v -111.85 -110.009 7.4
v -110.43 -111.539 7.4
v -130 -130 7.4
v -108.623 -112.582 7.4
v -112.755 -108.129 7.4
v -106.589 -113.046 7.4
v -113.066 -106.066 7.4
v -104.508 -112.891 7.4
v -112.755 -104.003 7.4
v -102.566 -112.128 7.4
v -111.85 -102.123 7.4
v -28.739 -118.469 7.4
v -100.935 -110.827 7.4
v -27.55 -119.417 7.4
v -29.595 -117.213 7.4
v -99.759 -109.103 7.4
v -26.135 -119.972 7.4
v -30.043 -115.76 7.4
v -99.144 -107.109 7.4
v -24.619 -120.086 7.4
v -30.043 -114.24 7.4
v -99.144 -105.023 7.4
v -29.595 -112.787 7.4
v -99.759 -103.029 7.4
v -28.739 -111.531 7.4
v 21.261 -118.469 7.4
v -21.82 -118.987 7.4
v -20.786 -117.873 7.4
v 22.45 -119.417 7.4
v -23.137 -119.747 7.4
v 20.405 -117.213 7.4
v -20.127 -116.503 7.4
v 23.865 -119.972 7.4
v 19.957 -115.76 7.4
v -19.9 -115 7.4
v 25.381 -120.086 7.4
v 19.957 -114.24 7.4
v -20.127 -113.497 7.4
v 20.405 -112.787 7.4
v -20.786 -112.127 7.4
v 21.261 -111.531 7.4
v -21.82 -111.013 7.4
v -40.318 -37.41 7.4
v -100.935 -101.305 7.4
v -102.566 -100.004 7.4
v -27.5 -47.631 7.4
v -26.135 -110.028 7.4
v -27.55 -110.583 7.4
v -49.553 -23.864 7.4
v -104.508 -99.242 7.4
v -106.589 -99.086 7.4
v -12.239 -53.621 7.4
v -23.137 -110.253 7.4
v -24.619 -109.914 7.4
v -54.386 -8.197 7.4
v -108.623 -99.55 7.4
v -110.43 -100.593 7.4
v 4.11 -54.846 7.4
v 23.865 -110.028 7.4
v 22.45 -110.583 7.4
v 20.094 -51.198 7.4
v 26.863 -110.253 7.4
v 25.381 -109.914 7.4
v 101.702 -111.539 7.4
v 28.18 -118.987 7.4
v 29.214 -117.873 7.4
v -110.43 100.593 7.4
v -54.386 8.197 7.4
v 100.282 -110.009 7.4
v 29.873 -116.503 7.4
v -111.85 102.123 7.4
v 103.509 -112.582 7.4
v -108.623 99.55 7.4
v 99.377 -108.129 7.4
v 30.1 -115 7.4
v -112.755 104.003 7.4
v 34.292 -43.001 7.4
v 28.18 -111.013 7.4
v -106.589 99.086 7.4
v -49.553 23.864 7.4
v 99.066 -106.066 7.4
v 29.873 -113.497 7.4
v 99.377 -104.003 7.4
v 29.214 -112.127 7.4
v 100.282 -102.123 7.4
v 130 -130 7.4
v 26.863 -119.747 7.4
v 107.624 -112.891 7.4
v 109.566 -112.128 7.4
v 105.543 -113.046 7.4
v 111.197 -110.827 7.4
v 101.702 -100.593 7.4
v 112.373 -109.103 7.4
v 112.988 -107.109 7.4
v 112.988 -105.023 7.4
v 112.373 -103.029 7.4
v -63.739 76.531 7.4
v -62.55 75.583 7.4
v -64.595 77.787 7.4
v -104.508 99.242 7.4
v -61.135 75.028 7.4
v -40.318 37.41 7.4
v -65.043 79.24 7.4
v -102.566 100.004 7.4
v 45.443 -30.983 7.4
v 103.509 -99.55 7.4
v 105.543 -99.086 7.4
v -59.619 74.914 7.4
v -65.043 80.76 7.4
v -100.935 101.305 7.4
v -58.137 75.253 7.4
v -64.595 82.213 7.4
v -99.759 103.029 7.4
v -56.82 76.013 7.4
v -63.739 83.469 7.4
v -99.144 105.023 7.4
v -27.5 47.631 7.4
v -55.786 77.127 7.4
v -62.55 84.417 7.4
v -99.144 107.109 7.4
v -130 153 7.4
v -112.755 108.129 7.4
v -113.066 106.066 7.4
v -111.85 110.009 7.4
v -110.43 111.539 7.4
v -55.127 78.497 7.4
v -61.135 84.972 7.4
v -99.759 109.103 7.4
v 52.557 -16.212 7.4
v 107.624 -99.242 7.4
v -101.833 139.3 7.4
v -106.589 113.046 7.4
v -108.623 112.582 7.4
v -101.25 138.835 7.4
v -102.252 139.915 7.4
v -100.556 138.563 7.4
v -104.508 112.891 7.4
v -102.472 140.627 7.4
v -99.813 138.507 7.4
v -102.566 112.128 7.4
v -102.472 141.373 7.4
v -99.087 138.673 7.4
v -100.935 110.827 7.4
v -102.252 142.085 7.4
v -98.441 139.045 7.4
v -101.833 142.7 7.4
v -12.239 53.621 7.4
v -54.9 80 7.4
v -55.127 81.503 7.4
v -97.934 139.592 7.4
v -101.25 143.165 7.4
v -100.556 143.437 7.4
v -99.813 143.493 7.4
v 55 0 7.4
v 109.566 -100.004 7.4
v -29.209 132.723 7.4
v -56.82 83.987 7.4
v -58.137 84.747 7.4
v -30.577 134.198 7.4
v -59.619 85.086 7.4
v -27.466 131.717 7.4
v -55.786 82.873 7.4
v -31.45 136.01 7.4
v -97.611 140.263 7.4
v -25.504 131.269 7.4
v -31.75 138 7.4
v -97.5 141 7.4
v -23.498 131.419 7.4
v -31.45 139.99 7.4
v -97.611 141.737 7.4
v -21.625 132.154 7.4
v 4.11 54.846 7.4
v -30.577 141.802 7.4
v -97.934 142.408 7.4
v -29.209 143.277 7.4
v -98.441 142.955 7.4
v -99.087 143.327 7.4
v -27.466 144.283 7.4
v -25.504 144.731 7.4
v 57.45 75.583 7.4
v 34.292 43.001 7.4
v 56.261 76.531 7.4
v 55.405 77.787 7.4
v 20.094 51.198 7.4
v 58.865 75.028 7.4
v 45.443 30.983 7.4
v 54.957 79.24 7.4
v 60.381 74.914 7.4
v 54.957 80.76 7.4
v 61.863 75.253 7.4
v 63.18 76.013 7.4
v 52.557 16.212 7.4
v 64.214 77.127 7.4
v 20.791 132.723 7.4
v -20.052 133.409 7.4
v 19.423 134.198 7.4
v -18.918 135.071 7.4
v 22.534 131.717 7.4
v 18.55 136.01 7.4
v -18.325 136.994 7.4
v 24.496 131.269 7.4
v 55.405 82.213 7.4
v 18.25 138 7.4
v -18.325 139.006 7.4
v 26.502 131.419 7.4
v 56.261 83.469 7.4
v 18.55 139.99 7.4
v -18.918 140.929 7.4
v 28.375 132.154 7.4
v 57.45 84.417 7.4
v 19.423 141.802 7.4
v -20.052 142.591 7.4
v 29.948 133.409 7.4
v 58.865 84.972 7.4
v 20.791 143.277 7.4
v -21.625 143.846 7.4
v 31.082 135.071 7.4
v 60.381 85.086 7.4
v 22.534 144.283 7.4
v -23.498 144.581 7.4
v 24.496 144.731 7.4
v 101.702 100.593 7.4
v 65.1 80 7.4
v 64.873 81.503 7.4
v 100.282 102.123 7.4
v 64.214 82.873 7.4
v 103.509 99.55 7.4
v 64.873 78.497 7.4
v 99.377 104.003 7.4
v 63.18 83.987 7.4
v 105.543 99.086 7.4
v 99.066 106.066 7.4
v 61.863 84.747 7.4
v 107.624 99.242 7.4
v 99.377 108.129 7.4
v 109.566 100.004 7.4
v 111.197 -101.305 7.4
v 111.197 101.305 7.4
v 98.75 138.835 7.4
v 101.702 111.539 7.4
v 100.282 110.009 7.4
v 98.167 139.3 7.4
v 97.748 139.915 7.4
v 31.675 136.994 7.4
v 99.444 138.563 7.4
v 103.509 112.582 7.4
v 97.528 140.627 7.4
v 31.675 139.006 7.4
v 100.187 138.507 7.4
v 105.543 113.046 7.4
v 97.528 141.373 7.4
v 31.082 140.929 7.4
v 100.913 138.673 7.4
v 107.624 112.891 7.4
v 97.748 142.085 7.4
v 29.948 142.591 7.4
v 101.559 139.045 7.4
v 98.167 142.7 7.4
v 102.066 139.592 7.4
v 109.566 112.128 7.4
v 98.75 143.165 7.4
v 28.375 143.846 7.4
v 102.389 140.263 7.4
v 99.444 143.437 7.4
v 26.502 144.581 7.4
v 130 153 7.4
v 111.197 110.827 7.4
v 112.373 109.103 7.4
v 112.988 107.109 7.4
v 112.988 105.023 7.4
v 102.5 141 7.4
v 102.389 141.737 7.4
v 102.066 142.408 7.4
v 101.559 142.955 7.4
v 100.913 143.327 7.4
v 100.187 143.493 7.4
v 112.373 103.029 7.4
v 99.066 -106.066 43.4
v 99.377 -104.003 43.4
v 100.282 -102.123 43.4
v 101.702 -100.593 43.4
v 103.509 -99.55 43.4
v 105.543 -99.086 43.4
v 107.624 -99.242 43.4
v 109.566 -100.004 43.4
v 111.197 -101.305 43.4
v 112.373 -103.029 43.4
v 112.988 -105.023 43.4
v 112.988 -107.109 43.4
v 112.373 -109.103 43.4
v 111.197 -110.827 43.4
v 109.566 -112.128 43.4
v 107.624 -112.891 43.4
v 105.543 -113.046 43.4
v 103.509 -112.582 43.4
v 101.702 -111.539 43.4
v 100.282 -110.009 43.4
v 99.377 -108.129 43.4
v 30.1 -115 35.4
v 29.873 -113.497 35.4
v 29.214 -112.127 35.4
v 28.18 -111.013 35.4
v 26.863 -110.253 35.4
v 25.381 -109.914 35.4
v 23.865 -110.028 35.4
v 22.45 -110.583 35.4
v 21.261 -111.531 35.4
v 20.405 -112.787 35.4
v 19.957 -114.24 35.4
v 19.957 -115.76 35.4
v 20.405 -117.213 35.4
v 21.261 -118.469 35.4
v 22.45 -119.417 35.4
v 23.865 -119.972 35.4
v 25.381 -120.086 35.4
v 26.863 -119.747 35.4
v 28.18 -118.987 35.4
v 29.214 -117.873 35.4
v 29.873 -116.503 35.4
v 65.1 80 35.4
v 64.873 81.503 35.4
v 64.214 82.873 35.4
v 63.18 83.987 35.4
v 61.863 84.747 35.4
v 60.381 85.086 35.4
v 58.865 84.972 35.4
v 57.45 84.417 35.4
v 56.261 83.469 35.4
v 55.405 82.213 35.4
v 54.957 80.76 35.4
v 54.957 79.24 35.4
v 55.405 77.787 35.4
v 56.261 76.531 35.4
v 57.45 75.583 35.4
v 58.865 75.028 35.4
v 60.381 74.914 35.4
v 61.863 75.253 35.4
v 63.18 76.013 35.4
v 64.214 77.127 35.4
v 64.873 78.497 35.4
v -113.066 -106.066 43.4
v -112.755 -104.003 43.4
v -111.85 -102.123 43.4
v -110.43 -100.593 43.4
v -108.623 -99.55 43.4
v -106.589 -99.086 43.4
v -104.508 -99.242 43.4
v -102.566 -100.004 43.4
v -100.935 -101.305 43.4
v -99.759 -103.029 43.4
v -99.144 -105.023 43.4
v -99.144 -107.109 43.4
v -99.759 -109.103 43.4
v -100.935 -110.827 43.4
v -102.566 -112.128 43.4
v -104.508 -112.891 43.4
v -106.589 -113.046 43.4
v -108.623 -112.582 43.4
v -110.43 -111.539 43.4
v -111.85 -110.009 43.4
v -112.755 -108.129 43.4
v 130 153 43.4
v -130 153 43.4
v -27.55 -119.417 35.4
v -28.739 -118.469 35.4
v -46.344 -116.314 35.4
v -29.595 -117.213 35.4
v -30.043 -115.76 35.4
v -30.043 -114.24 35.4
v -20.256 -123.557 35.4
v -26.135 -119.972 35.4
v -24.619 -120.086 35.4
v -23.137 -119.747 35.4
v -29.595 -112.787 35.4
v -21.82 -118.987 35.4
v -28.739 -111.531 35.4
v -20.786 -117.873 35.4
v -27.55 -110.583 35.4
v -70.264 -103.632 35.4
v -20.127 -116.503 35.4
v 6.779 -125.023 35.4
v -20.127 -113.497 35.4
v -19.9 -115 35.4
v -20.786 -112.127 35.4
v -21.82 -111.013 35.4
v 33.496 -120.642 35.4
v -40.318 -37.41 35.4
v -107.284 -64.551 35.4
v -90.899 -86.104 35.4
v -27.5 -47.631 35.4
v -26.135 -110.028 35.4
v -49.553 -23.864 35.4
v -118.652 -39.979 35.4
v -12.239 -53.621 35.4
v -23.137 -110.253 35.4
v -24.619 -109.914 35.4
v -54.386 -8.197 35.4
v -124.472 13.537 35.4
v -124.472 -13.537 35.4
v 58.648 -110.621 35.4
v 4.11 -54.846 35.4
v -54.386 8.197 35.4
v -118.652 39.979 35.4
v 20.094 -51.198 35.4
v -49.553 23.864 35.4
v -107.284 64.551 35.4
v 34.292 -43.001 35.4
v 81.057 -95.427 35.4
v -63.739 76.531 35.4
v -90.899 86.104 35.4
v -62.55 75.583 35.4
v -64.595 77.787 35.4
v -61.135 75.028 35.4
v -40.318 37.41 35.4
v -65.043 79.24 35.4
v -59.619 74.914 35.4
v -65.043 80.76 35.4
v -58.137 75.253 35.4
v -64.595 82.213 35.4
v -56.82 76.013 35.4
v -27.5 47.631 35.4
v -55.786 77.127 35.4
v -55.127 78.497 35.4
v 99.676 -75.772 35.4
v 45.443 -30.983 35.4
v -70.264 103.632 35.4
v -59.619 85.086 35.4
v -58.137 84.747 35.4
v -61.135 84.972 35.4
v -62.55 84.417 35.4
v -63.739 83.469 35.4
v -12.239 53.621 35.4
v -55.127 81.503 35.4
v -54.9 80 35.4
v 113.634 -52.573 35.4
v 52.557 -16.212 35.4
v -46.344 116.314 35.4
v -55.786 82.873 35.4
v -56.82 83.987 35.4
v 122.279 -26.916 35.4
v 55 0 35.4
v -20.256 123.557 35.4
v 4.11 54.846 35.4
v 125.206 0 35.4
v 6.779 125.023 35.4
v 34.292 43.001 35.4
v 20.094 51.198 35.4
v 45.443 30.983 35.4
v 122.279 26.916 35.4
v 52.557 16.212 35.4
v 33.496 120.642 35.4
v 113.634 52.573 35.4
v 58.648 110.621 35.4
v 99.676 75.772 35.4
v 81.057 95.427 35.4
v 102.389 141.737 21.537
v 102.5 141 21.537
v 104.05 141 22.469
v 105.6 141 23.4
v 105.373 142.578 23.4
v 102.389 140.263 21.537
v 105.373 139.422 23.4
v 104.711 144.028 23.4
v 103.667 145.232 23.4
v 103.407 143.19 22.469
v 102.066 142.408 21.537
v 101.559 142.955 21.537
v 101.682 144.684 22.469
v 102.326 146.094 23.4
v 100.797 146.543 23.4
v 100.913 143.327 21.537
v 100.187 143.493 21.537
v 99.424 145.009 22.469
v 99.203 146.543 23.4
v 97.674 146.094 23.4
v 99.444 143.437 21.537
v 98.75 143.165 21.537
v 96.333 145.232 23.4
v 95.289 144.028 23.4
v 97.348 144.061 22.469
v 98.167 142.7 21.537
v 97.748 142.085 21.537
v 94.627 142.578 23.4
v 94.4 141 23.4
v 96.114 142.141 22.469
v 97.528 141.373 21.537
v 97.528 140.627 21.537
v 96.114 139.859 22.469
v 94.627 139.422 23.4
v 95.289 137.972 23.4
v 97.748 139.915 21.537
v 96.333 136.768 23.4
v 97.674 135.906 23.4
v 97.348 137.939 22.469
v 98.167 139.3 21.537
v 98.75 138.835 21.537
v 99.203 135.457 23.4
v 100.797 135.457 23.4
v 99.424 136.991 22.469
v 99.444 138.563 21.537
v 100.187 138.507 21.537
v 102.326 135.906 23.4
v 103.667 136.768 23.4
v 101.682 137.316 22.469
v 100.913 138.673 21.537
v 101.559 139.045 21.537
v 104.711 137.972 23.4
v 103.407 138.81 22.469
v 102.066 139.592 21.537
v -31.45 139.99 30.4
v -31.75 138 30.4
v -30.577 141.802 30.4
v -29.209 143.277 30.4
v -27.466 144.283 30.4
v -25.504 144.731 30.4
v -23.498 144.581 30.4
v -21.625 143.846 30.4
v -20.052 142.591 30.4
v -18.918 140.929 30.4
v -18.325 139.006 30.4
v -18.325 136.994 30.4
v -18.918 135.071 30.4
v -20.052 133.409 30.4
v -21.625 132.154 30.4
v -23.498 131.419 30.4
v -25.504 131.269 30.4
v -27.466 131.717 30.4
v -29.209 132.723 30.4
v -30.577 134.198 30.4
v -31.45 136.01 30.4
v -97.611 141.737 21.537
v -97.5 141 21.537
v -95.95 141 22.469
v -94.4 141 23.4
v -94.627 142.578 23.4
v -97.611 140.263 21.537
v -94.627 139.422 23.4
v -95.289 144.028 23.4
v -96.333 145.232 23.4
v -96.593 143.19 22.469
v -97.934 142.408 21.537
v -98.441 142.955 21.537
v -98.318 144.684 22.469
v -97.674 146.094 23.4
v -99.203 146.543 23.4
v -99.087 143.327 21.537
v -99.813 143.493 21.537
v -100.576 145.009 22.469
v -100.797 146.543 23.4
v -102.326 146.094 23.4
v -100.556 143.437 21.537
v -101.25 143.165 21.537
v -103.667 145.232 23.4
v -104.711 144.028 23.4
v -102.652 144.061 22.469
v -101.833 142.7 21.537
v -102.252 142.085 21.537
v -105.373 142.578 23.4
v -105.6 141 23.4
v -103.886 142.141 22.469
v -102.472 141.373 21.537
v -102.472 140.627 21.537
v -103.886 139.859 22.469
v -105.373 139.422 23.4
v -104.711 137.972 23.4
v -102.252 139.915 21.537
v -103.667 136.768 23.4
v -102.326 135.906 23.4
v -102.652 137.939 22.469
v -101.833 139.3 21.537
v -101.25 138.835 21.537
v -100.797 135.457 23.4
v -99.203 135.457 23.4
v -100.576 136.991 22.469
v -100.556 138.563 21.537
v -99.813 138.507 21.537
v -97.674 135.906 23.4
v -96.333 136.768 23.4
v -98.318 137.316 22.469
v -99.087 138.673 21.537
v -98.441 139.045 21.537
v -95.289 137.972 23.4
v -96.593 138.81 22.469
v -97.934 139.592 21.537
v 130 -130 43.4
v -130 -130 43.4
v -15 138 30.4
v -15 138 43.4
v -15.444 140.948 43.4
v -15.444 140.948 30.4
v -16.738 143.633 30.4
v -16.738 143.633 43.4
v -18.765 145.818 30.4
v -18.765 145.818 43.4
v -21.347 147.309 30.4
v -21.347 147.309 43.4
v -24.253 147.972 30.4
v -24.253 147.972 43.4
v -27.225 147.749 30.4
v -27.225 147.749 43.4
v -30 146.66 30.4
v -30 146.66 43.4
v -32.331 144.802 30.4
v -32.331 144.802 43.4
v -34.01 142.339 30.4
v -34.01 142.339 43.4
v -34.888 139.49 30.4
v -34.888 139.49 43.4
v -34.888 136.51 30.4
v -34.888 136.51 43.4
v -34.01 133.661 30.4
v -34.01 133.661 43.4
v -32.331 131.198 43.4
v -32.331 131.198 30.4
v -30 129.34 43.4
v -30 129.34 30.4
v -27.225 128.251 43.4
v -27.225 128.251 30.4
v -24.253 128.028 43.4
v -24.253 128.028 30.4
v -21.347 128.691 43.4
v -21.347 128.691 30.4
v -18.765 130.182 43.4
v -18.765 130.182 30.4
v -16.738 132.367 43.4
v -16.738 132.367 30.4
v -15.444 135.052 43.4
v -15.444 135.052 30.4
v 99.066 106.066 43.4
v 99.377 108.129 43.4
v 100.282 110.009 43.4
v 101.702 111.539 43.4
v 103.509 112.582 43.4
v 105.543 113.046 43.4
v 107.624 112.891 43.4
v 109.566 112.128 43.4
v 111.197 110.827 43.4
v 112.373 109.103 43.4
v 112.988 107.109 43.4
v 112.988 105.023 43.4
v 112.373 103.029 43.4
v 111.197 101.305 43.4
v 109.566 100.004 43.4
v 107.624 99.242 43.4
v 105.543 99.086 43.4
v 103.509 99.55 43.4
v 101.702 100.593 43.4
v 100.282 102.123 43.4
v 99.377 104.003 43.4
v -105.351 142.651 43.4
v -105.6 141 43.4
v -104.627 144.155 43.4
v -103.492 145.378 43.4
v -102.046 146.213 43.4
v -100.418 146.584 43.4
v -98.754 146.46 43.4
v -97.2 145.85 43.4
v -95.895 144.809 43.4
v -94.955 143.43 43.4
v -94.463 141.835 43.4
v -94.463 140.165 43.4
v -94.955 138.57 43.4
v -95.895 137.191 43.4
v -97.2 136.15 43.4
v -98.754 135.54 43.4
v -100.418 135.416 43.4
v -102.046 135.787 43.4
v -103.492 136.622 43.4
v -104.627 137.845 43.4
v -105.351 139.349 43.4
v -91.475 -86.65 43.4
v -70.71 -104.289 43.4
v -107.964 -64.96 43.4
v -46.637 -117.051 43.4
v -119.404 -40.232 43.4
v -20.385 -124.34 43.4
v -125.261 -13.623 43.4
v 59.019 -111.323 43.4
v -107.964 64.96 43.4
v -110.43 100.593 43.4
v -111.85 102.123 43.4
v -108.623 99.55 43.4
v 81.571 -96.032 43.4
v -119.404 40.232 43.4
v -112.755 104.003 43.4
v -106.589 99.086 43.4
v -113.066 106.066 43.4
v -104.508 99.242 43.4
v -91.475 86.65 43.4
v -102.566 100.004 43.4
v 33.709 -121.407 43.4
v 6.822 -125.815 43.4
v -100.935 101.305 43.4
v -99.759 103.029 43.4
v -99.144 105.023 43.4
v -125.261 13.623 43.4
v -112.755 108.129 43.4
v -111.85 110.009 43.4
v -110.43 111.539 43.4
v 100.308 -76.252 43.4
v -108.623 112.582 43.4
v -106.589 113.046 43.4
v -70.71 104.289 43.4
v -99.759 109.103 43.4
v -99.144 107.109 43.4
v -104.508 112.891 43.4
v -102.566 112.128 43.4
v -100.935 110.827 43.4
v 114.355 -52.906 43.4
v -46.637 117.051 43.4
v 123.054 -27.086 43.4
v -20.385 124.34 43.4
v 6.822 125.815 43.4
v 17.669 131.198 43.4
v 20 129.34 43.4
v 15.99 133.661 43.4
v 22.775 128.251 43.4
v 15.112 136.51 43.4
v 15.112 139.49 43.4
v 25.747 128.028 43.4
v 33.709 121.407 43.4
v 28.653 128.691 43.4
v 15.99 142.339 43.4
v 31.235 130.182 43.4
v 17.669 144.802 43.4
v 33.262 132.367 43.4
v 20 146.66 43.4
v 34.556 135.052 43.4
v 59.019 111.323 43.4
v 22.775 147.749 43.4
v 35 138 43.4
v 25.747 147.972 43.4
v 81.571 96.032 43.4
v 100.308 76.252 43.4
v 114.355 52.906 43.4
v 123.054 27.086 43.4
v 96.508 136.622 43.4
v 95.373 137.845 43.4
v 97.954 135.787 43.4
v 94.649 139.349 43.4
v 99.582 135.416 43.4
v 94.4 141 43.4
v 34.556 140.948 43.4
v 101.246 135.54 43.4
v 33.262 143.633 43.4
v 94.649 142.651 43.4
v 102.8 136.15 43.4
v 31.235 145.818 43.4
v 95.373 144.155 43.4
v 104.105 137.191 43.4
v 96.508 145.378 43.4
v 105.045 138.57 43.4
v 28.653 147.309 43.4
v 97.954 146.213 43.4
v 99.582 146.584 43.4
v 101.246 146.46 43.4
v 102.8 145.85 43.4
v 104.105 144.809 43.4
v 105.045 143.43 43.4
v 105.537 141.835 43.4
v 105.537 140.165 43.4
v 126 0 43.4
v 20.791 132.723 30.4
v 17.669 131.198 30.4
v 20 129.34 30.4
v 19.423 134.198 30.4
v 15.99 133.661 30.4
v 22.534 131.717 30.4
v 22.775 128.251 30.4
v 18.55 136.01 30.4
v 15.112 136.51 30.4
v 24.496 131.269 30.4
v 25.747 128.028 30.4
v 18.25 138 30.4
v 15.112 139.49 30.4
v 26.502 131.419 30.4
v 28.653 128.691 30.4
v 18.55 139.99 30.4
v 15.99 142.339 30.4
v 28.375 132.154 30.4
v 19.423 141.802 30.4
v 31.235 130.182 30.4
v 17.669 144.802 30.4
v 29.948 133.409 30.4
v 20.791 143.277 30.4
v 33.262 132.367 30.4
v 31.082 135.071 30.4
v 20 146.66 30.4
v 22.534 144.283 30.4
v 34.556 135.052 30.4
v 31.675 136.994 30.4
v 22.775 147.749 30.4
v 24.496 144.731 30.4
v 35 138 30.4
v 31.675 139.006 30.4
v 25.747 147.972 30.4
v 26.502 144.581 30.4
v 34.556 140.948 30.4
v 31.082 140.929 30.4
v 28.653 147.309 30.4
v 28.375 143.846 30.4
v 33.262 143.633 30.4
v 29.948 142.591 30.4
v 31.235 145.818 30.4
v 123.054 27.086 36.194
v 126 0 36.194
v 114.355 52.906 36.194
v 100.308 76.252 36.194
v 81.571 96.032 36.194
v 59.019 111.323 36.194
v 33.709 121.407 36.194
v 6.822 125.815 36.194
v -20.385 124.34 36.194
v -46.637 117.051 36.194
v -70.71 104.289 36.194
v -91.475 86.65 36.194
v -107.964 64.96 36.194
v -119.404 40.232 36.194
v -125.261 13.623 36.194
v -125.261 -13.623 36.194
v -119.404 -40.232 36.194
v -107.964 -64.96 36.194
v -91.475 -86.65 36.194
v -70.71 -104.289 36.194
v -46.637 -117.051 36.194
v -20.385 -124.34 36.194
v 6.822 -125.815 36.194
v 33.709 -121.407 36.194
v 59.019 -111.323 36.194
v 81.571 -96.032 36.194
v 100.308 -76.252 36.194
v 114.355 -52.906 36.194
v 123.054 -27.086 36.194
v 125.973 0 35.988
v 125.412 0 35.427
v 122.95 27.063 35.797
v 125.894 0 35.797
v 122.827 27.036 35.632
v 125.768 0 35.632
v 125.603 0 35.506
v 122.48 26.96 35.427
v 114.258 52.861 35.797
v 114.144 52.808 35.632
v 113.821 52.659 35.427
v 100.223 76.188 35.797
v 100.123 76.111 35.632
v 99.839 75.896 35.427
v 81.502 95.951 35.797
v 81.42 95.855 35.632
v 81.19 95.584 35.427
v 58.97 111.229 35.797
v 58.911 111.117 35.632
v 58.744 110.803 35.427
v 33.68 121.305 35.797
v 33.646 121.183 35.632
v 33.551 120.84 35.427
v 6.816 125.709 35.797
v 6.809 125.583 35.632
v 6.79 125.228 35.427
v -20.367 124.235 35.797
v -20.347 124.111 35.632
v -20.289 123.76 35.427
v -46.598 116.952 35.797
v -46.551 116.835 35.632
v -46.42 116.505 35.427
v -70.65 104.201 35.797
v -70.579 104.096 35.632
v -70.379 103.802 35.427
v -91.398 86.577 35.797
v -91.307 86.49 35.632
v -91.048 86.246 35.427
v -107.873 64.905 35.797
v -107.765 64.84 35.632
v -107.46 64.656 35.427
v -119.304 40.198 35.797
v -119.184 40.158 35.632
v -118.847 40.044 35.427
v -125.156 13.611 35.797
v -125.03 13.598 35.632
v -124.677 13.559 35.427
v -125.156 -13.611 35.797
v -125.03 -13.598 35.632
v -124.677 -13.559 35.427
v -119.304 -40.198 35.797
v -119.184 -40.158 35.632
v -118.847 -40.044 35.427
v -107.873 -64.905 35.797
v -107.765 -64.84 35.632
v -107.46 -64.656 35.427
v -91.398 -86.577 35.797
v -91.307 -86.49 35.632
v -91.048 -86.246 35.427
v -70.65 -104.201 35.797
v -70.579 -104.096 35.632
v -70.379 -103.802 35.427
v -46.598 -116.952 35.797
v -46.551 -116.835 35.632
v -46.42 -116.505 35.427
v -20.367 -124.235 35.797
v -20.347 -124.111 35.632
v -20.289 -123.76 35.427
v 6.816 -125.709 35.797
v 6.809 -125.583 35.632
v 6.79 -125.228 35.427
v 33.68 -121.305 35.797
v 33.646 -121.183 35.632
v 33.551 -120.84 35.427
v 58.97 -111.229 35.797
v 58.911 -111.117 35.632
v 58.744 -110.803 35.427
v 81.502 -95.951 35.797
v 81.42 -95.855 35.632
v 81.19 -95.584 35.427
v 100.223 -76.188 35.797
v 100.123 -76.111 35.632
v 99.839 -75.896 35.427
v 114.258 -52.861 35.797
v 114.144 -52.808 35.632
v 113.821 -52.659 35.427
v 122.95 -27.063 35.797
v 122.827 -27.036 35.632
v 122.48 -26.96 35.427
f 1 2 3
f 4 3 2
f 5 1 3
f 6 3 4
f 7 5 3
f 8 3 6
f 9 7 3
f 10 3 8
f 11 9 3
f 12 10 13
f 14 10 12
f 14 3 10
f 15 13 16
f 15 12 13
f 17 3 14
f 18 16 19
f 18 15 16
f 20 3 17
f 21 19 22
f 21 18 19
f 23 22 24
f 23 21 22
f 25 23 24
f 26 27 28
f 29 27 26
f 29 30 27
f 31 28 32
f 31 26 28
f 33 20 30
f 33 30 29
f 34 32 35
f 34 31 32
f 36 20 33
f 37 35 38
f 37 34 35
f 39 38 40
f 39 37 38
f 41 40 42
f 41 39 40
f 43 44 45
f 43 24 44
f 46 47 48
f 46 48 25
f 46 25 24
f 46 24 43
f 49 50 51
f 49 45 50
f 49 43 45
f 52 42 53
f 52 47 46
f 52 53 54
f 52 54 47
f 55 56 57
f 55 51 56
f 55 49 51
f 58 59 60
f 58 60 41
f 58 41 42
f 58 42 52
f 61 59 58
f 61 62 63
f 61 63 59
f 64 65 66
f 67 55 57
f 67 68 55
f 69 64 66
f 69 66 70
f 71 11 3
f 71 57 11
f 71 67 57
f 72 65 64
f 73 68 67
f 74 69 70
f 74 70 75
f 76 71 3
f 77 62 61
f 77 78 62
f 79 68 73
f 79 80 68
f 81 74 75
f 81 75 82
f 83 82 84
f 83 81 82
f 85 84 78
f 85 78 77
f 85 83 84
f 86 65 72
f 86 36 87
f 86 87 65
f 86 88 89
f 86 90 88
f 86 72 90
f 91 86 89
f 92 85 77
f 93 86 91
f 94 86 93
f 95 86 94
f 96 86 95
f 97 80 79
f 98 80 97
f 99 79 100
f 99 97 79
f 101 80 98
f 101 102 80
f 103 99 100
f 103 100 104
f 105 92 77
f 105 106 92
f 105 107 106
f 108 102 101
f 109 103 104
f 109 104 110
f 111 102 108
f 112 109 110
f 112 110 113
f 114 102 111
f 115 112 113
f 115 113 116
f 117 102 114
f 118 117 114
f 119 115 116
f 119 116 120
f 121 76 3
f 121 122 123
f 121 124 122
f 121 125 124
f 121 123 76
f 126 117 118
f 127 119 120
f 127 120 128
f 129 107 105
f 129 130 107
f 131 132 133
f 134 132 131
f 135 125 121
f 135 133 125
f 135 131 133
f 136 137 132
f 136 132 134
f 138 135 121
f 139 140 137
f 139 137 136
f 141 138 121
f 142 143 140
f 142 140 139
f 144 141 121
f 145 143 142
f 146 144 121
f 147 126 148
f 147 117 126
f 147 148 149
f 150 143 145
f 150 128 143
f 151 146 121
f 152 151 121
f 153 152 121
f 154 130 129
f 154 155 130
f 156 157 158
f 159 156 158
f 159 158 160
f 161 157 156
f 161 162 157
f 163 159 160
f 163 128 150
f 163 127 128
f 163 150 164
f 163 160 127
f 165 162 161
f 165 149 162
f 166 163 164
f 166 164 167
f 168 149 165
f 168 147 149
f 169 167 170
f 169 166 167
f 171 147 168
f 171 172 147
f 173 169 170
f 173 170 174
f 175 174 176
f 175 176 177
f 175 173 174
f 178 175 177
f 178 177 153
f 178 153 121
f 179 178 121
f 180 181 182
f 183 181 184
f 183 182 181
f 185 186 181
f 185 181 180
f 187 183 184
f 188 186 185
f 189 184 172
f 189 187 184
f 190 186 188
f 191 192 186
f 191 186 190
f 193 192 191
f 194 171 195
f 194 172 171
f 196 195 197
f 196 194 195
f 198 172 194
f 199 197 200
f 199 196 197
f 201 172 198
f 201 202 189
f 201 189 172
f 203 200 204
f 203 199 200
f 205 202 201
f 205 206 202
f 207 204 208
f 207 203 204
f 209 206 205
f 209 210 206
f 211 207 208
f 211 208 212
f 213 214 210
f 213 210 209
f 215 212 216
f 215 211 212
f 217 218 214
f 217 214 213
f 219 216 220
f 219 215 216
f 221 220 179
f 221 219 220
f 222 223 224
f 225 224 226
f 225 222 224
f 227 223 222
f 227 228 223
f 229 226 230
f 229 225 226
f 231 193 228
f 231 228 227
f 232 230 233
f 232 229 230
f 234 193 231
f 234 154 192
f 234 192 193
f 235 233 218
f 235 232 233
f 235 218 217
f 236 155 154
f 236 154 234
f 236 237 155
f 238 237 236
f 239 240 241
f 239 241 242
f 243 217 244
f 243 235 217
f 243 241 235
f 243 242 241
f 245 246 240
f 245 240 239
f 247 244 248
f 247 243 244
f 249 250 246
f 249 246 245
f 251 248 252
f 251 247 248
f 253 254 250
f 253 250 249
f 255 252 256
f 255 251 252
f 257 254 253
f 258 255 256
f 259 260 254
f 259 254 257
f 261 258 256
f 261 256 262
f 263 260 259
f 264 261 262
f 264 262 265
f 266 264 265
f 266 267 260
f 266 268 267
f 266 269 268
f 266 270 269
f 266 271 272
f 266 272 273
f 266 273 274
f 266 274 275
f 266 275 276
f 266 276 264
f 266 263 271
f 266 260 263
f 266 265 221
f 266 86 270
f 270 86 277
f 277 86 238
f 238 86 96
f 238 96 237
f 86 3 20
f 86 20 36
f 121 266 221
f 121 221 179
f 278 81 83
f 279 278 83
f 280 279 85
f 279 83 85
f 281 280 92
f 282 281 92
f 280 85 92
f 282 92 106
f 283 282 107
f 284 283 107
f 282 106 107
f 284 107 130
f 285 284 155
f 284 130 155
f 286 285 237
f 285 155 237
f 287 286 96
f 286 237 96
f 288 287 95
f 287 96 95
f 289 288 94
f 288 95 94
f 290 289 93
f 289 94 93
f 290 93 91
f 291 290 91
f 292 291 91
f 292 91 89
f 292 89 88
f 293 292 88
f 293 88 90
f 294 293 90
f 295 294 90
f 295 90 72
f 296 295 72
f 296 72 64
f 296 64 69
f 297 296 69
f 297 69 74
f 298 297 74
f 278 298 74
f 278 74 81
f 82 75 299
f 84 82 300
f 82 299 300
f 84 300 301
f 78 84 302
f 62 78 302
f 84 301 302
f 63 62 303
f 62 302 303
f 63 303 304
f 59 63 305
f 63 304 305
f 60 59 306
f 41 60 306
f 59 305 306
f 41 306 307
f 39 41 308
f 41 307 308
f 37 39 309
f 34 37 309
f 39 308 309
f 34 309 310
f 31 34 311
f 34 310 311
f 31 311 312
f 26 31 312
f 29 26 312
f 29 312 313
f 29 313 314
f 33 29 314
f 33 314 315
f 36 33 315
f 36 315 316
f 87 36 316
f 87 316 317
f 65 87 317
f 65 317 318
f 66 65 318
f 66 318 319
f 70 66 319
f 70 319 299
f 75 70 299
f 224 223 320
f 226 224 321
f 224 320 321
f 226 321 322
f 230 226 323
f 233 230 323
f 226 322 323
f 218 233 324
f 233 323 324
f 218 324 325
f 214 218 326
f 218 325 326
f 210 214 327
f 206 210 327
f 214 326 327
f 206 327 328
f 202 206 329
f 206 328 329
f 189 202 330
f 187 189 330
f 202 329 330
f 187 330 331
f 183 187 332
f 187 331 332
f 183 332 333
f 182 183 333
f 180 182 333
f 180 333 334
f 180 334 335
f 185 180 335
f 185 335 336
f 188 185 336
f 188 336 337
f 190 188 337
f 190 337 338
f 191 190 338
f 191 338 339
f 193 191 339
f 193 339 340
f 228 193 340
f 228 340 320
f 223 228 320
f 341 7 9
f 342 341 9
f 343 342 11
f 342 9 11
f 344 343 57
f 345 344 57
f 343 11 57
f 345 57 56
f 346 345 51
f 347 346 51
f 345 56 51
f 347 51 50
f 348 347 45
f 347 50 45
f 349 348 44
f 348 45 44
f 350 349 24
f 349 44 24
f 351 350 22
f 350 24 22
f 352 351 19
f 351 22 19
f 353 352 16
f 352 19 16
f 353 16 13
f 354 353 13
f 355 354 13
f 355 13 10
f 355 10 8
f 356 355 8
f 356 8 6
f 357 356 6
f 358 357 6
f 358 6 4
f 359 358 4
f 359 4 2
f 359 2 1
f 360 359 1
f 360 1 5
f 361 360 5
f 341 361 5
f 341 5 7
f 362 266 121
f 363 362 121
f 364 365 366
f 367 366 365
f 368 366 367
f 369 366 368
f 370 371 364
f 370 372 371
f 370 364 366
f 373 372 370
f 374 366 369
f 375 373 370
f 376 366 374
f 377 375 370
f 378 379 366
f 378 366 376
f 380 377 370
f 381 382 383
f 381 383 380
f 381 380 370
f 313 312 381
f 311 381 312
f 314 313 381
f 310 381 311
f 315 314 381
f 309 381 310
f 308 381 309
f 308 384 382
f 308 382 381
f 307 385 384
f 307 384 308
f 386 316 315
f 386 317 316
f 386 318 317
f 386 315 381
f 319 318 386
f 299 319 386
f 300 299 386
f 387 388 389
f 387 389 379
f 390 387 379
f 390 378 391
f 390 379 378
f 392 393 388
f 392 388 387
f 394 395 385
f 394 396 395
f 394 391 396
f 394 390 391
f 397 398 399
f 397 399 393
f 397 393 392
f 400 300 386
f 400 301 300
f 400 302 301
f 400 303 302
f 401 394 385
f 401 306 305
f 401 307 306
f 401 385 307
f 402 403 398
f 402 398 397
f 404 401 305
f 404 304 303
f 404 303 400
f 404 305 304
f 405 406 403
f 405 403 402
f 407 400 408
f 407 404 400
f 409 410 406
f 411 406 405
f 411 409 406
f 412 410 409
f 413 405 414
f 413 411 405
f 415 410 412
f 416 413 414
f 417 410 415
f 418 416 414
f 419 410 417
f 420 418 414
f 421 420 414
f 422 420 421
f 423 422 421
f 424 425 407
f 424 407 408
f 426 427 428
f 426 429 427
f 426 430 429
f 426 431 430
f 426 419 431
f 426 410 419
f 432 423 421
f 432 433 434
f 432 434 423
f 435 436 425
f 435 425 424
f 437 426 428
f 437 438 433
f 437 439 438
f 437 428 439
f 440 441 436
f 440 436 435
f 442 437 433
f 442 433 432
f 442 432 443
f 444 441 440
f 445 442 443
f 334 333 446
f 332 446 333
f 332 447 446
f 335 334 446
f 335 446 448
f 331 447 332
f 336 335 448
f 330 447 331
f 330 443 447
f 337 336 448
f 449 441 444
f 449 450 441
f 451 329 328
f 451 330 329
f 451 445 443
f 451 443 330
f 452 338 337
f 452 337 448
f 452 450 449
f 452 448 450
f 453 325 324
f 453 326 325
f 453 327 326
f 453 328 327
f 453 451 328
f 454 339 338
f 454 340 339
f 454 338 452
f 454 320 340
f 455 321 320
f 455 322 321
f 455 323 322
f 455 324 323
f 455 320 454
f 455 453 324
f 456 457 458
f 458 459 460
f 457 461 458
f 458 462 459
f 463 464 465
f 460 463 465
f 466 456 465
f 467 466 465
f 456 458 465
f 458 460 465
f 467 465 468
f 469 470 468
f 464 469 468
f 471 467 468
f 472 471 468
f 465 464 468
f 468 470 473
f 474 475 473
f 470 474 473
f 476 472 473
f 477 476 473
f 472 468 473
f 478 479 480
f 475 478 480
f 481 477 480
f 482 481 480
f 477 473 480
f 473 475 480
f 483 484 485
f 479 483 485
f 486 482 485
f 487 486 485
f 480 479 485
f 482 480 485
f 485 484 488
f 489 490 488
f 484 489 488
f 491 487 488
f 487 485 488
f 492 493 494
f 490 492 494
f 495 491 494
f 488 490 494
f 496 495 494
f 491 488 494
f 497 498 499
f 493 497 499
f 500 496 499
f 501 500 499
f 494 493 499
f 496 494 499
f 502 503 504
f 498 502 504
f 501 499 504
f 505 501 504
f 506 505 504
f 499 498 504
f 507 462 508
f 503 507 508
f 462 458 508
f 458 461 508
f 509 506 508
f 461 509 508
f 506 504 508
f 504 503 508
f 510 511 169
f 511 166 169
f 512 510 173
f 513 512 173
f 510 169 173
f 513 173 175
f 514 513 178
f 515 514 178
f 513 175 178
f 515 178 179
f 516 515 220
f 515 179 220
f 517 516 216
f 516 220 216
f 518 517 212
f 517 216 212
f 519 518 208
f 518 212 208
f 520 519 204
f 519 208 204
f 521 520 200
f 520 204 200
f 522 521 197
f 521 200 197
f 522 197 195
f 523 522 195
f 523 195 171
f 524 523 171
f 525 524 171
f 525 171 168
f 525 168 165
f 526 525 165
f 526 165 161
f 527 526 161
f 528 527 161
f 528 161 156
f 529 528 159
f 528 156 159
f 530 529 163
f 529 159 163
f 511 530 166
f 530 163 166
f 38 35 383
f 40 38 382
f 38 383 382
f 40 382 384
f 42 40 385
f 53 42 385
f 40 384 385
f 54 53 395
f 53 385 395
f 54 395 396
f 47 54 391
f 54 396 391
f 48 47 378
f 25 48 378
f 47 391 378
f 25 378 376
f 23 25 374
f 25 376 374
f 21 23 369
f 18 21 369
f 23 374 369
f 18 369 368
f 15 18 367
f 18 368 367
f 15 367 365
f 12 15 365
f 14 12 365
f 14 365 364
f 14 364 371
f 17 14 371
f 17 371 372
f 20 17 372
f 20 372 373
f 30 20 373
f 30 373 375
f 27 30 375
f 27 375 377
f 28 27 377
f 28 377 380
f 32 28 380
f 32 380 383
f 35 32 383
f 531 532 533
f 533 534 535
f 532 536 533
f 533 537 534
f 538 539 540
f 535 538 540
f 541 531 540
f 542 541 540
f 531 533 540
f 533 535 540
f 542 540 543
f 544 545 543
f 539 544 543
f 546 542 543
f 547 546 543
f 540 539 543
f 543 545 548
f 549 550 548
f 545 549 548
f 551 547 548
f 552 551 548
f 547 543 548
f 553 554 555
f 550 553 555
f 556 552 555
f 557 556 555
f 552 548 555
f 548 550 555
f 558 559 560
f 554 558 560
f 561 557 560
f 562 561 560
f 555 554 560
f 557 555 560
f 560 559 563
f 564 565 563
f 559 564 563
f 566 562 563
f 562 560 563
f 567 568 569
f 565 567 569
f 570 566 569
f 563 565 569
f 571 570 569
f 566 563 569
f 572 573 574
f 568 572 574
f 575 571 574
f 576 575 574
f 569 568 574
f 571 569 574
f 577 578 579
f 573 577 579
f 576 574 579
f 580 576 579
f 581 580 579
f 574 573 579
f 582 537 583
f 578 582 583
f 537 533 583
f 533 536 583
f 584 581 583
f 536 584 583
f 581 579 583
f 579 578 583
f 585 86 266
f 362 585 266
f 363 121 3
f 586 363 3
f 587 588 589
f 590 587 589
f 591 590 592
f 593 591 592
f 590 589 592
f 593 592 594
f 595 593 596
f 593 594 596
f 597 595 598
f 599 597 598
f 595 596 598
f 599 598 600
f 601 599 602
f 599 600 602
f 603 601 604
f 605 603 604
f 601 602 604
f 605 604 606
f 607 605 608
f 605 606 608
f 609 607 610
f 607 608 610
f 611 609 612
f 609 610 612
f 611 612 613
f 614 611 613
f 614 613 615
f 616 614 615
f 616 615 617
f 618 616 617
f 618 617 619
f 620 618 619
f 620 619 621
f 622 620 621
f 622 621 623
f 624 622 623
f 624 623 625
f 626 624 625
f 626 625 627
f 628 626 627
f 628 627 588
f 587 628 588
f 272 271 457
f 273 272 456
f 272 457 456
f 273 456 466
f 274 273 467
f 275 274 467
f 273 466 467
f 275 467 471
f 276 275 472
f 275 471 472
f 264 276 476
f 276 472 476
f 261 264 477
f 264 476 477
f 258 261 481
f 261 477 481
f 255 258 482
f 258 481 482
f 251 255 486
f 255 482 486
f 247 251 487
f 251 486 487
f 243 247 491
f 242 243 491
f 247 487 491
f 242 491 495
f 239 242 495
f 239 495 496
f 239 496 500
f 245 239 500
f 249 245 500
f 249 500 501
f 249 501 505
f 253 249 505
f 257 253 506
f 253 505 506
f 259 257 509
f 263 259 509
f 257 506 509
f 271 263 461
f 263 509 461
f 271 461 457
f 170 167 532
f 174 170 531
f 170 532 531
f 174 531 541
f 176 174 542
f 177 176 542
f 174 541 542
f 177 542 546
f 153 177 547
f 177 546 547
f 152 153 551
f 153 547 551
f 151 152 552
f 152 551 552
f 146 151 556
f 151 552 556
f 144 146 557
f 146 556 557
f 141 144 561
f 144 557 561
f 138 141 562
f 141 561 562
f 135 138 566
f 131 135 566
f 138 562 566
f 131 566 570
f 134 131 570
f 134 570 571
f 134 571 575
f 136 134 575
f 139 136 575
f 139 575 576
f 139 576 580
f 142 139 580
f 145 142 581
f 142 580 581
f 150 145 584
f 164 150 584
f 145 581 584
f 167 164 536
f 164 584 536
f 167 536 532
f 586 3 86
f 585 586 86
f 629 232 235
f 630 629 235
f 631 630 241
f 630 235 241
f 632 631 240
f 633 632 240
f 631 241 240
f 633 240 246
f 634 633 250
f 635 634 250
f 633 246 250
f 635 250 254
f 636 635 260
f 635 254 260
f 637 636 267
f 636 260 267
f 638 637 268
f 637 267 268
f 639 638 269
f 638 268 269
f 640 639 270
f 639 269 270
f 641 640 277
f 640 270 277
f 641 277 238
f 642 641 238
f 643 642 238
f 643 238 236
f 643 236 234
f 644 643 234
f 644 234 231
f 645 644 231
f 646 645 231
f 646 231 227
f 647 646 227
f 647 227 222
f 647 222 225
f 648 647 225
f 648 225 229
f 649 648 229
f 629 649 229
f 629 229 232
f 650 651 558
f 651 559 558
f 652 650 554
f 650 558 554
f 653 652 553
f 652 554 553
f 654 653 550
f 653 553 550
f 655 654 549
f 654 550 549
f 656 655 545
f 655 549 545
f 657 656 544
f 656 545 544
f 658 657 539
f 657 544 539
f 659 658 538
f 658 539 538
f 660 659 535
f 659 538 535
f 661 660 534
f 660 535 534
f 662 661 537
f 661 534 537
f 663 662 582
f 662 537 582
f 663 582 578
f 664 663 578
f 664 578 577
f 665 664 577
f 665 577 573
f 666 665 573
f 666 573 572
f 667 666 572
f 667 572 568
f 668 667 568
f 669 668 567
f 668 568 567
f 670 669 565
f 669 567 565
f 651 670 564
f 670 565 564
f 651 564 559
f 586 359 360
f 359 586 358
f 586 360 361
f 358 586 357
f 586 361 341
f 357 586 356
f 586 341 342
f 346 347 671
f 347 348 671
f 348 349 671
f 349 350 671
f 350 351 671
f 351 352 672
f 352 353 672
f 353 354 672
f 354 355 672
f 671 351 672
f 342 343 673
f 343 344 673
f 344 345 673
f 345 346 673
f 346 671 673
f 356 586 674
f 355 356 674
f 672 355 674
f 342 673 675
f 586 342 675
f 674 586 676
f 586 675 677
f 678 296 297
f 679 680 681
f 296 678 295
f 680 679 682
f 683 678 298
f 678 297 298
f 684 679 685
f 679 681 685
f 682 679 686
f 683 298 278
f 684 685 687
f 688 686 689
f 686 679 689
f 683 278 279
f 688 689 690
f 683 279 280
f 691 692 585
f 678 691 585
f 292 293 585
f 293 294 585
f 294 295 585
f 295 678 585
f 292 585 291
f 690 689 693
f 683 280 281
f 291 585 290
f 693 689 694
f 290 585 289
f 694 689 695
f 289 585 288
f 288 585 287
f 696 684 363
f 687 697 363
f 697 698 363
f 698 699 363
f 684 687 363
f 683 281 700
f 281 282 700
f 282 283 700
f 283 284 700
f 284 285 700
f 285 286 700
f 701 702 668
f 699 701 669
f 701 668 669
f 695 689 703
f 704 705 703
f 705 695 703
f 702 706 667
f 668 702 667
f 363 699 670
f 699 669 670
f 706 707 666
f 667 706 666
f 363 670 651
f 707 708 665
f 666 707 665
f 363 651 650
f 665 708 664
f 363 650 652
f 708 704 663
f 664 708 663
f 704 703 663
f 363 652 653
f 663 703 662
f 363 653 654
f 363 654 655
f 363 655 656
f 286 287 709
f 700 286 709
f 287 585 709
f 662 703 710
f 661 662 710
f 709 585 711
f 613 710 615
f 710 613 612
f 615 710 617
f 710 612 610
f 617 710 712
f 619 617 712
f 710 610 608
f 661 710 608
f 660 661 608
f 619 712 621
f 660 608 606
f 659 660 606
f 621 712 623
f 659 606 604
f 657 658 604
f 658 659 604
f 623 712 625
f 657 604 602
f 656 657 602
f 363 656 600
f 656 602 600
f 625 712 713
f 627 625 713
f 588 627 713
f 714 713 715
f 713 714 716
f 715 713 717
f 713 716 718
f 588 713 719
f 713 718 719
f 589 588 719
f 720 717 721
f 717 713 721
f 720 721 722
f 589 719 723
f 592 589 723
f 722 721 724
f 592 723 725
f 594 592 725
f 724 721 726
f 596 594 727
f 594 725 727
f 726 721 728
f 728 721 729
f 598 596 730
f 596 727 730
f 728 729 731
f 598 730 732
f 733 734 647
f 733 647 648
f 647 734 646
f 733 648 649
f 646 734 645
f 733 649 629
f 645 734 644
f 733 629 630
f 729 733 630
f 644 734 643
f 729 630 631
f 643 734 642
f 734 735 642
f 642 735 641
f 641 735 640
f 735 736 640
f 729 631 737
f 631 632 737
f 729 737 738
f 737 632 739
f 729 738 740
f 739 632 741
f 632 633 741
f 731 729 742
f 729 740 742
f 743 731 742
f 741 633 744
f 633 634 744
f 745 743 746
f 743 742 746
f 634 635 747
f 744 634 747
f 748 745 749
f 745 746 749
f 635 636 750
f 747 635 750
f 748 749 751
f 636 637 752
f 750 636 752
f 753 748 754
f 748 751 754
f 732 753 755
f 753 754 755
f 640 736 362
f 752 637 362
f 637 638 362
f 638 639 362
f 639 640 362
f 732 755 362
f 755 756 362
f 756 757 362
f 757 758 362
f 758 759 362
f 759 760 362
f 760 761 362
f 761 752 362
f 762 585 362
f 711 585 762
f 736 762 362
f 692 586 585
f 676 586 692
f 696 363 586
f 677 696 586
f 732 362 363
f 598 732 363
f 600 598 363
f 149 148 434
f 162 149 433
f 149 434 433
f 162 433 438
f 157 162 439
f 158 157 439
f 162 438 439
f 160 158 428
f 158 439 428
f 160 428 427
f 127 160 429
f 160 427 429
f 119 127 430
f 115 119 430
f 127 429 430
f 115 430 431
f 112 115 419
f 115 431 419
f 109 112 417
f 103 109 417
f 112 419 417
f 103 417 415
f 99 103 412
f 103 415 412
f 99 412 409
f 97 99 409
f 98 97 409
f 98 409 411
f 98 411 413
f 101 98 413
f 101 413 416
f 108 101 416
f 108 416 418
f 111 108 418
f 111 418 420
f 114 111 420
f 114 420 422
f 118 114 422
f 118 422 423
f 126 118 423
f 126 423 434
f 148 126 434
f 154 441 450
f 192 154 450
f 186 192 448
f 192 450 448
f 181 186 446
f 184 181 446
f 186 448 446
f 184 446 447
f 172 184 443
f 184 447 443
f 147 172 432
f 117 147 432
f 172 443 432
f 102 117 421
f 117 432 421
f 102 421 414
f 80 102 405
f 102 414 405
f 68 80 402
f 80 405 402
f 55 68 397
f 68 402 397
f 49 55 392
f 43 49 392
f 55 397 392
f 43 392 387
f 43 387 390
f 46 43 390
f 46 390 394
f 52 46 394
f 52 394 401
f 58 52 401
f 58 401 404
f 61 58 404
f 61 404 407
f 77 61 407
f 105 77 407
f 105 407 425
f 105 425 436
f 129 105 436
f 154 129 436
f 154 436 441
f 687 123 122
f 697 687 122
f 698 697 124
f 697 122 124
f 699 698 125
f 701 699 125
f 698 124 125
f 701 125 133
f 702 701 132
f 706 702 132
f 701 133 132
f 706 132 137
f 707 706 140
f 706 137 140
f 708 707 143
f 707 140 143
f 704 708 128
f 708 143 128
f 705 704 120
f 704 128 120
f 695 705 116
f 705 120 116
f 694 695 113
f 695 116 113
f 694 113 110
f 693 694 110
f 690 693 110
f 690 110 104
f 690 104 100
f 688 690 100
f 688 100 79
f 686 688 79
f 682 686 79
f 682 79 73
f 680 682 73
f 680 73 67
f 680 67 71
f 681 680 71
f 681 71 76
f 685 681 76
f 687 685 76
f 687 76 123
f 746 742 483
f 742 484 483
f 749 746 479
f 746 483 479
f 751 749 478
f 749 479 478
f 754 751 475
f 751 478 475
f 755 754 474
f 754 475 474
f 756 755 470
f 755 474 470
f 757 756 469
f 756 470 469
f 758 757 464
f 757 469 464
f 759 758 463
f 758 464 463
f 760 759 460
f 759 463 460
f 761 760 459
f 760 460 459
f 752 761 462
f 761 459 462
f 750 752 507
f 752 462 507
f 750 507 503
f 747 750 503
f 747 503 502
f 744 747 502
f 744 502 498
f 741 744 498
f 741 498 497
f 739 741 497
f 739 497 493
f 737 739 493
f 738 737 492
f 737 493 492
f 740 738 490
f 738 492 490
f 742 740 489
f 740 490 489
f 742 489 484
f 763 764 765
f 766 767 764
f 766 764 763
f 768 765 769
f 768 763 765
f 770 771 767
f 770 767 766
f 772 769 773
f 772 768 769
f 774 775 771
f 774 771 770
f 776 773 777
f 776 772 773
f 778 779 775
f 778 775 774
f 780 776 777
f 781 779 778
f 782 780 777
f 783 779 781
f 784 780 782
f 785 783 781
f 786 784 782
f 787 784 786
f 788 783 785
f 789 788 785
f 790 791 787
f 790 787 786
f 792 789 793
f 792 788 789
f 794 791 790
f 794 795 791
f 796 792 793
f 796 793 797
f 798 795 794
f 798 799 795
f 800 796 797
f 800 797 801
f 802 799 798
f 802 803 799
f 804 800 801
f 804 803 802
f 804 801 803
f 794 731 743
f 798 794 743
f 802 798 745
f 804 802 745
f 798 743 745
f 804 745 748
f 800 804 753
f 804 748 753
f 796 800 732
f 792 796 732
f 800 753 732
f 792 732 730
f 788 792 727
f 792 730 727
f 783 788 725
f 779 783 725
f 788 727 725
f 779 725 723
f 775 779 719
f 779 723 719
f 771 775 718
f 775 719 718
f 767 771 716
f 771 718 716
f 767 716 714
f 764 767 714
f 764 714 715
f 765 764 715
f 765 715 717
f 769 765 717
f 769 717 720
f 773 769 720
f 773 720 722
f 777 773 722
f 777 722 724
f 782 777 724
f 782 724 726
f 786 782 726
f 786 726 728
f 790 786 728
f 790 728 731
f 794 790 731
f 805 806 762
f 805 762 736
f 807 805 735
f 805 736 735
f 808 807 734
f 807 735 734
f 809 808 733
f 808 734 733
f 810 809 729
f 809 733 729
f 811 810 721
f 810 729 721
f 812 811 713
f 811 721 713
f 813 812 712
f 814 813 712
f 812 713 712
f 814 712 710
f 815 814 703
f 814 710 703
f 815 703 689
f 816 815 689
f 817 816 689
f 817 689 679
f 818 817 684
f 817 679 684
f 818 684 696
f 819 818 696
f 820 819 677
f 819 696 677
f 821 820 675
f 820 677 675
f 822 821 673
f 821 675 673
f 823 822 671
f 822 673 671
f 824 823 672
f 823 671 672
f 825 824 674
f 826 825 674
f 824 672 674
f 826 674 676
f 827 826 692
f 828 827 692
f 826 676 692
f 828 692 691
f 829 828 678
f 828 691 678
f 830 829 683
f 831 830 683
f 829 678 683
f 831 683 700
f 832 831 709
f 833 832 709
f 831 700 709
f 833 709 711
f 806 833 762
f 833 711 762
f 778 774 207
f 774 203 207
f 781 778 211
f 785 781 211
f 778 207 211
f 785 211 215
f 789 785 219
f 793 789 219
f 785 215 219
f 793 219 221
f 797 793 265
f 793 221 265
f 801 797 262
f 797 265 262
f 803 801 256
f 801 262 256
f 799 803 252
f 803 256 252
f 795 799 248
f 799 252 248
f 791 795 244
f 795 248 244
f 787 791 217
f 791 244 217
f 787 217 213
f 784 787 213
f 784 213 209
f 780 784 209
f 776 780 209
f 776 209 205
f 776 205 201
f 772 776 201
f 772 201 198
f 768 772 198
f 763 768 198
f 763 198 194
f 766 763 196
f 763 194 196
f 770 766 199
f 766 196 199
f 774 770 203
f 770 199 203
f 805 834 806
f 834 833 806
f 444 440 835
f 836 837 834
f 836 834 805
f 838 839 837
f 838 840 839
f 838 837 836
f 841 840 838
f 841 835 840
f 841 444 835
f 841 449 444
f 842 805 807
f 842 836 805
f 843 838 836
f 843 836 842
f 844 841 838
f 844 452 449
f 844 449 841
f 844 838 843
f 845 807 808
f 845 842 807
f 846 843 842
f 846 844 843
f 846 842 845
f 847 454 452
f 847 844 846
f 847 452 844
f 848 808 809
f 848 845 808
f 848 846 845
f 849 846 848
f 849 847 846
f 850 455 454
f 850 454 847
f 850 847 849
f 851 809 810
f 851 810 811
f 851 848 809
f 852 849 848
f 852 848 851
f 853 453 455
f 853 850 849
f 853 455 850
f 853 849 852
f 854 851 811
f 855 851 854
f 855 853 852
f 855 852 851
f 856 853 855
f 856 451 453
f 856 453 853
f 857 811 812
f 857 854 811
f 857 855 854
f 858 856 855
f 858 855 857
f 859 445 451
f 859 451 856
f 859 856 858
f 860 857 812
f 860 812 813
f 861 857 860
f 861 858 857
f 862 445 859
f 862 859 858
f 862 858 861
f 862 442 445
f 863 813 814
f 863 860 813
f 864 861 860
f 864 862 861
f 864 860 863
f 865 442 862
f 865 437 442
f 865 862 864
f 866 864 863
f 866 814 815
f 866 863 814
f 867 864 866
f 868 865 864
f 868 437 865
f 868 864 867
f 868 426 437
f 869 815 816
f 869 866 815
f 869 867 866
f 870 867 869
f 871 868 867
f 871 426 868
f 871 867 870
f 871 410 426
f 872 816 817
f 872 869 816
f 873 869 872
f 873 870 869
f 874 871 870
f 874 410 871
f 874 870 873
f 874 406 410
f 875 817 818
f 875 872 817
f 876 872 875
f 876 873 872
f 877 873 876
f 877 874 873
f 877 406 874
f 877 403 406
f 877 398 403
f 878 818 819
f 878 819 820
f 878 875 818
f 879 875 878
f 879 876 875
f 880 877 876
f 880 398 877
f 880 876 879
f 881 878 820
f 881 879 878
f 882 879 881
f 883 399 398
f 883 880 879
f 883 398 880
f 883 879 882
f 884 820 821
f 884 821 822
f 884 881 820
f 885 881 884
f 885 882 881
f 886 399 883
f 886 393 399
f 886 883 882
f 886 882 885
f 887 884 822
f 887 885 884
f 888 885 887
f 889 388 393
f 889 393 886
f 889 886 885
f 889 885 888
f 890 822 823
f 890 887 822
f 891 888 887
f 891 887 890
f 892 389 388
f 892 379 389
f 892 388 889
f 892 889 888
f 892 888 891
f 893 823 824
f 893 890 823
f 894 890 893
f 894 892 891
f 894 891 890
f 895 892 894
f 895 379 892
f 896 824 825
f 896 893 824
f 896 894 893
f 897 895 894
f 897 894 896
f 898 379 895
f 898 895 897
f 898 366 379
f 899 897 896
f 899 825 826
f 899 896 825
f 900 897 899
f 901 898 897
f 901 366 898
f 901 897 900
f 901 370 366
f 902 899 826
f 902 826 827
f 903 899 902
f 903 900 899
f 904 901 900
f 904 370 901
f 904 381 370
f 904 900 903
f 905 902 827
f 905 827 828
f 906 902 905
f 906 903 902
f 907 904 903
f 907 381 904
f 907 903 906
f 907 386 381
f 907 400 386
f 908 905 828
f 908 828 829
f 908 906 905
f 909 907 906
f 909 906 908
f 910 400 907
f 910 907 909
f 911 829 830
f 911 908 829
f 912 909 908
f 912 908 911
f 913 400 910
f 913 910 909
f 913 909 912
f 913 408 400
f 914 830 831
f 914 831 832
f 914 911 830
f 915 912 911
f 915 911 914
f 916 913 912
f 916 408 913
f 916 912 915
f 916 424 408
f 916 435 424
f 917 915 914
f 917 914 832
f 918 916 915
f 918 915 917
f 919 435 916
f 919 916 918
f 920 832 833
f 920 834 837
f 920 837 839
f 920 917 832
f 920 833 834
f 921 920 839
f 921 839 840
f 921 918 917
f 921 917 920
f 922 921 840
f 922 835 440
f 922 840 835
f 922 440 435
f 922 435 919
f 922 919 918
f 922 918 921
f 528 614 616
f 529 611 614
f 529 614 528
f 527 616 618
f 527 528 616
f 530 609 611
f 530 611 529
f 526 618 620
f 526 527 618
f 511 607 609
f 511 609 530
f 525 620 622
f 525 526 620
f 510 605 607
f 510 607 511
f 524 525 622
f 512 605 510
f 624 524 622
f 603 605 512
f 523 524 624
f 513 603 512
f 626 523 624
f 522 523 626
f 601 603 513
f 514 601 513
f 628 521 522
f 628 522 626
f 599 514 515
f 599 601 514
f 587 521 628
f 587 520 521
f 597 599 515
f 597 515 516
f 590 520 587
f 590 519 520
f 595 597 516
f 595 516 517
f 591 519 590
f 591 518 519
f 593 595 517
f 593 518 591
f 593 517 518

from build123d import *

# Parameters (mm, degrees)
BOSS_EXTRUDE1_DEPTH                                  = 50.8
SKETCH6_W                                            = 7.4
SKETCH6_H                                            = 283
CUT_EXTRUDE3_DEPTH                                   = 306.924238987
SKETCH2_R                                            = 126
CUT_EXTRUDE1_DEPTH                                   = 8
M16_TAPPED_HOLE1_D                                   = 14
SKETCH5_R                                            = 55
CUT_EXTRUDE2_DEPTH                                   = 203.714084365
FILLET1_R                                            = 0.79375
CBORE_FOR_M12_HEX_SOCKET_HEAD_CAP_SCREW1_D           = 13.5
CBORE_FOR_M12_HEX_SOCKET_HEAD_CAP_SCREW1_CBORE_D     = 20
CBORE_FOR_M12_HEX_SOCKET_HEAD_CAP_SCREW1_CBORE_DEPTH = 13
M12_TAPPED_HOLE1_D                                   = 10.2
M6_TAPPED_HOLE1_D                                    = 5
M6_TAPPED_HOLE1_DEPTH                                = 27.99
M6_TAPPED_HOLE1_TIP                                  = 1.502151548
F_11_2_11_2_DIAMETER_HOLE1_D                         = 11.2
F_11_2_11_2_DIAMETER_HOLE1_DEPTH                     = 20
F_11_2_11_2_DIAMETER_HOLE1_TIP                       = 3.364819467


with BuildPart() as part:
    # Sketch1 → Boss-Extrude1 (new body)
    with BuildSketch(Plane.XY):
        Polygon((-130, 130), (-130, -130), (130, -130), (130, 130), (130, 153), (-130, 153), align=None)
    extrude(amount=BOSS_EXTRUDE1_DEPTH)

    # Sketch6 → Cut-Extrude3 (cut, through all)
    with BuildSketch(Plane(origin=(130, 0, 0), x_dir=(0, 0, -1), z_dir=(1, 0, 0))):
        with Locations((-3.7, 11.5)):
            Rectangle(SKETCH6_W, SKETCH6_H)
        with Locations((-47.1, 11.5)):
            Rectangle(SKETCH6_W, SKETCH6_H)
    extrude(amount=-CUT_EXTRUDE3_DEPTH, mode=Mode.SUBTRACT)

    # Sketch2 → Cut-Extrude1 (cut)
    with BuildSketch(Plane.XY.offset(43.4)):
        Circle(SKETCH2_R)
    extrude(amount=-CUT_EXTRUDE1_DEPTH, mode=Mode.SUBTRACT)

    # M16 Tapped Hole1 (through all)
    with Locations(Plane(origin=(116.1053078, 120.483553204, 43.4), x_dir=(1, 0, 0), z_dir=(0, 0, 1))):
        with Locations((-222.171324978, -14.417536026), (-10.039290622, -14.417536026), (-10.039290622, -226.549570382), (-222.171324978, -226.549570382)):
            Hole(M16_TAPPED_HOLE1_D / 2)

    # Sketch5 → Cut-Extrude2 (cut, through all)
    with BuildSketch(Plane.XY.offset(35.4)):
        Circle(SKETCH5_R)
    extrude(amount=-CUT_EXTRUDE2_DEPTH, mode=Mode.SUBTRACT)

    # Fillet1
    fillet1_edges = [part.edges().sort_by_distance(p)[0] for p in [
        (-126, 0, 35.4),
    ]]
    fillet(fillet1_edges, radius=FILLET1_R)

    # CBORE for M12 Hex Socket Head Cap Screw1 (through all)
    with Locations(Plane.XY.offset(43.4)):
        with Locations((-25, 138), (25, 138)):
            CounterBoreHole(CBORE_FOR_M12_HEX_SOCKET_HEAD_CAP_SCREW1_D / 2, CBORE_FOR_M12_HEX_SOCKET_HEAD_CAP_SCREW1_CBORE_D / 2, CBORE_FOR_M12_HEX_SOCKET_HEAD_CAP_SCREW1_CBORE_DEPTH)

    # M12 Tapped Hole1 (through all)
    with Locations(Plane(origin=(0, 0, 7.4), x_dir=(-1, 0, 0), z_dir=(0, 0, -1))):
        with Locations((-60, 80), (60, 80), (25, -115), (-25, -115)):
            Hole(M12_TAPPED_HOLE1_D / 2)

    # M6 Tapped Hole1
    with Locations(Plane(origin=(0, 0, 7.4), x_dir=(-1, 0, 0), z_dir=(0, 0, -1))):
        with Locations((100, 141), (-100, 141)):
            Hole(M6_TAPPED_HOLE1_D / 2, depth=M6_TAPPED_HOLE1_DEPTH)
            with Locations((0, 0, -(M6_TAPPED_HOLE1_DEPTH + M6_TAPPED_HOLE1_TIP / 2))):  # 118° drill point
                Cone(0, M6_TAPPED_HOLE1_D / 2, M6_TAPPED_HOLE1_TIP, mode=Mode.SUBTRACT)

    # Ø11.2 (11.2) Diameter Hole1
    with Locations(Plane.XY.offset(43.4)):
        with Locations((100, 141), (-100, 141)):
            Hole(F_11_2_11_2_DIAMETER_HOLE1_D / 2, depth=F_11_2_11_2_DIAMETER_HOLE1_DEPTH)
            with Locations((0, 0, -(F_11_2_11_2_DIAMETER_HOLE1_DEPTH + F_11_2_11_2_DIAMETER_HOLE1_TIP / 2))):  # 118° drill point
                Cone(0, F_11_2_11_2_DIAMETER_HOLE1_D / 2, F_11_2_11_2_DIAMETER_HOLE1_TIP, mode=Mode.SUBTRACT)


solid = part.part
